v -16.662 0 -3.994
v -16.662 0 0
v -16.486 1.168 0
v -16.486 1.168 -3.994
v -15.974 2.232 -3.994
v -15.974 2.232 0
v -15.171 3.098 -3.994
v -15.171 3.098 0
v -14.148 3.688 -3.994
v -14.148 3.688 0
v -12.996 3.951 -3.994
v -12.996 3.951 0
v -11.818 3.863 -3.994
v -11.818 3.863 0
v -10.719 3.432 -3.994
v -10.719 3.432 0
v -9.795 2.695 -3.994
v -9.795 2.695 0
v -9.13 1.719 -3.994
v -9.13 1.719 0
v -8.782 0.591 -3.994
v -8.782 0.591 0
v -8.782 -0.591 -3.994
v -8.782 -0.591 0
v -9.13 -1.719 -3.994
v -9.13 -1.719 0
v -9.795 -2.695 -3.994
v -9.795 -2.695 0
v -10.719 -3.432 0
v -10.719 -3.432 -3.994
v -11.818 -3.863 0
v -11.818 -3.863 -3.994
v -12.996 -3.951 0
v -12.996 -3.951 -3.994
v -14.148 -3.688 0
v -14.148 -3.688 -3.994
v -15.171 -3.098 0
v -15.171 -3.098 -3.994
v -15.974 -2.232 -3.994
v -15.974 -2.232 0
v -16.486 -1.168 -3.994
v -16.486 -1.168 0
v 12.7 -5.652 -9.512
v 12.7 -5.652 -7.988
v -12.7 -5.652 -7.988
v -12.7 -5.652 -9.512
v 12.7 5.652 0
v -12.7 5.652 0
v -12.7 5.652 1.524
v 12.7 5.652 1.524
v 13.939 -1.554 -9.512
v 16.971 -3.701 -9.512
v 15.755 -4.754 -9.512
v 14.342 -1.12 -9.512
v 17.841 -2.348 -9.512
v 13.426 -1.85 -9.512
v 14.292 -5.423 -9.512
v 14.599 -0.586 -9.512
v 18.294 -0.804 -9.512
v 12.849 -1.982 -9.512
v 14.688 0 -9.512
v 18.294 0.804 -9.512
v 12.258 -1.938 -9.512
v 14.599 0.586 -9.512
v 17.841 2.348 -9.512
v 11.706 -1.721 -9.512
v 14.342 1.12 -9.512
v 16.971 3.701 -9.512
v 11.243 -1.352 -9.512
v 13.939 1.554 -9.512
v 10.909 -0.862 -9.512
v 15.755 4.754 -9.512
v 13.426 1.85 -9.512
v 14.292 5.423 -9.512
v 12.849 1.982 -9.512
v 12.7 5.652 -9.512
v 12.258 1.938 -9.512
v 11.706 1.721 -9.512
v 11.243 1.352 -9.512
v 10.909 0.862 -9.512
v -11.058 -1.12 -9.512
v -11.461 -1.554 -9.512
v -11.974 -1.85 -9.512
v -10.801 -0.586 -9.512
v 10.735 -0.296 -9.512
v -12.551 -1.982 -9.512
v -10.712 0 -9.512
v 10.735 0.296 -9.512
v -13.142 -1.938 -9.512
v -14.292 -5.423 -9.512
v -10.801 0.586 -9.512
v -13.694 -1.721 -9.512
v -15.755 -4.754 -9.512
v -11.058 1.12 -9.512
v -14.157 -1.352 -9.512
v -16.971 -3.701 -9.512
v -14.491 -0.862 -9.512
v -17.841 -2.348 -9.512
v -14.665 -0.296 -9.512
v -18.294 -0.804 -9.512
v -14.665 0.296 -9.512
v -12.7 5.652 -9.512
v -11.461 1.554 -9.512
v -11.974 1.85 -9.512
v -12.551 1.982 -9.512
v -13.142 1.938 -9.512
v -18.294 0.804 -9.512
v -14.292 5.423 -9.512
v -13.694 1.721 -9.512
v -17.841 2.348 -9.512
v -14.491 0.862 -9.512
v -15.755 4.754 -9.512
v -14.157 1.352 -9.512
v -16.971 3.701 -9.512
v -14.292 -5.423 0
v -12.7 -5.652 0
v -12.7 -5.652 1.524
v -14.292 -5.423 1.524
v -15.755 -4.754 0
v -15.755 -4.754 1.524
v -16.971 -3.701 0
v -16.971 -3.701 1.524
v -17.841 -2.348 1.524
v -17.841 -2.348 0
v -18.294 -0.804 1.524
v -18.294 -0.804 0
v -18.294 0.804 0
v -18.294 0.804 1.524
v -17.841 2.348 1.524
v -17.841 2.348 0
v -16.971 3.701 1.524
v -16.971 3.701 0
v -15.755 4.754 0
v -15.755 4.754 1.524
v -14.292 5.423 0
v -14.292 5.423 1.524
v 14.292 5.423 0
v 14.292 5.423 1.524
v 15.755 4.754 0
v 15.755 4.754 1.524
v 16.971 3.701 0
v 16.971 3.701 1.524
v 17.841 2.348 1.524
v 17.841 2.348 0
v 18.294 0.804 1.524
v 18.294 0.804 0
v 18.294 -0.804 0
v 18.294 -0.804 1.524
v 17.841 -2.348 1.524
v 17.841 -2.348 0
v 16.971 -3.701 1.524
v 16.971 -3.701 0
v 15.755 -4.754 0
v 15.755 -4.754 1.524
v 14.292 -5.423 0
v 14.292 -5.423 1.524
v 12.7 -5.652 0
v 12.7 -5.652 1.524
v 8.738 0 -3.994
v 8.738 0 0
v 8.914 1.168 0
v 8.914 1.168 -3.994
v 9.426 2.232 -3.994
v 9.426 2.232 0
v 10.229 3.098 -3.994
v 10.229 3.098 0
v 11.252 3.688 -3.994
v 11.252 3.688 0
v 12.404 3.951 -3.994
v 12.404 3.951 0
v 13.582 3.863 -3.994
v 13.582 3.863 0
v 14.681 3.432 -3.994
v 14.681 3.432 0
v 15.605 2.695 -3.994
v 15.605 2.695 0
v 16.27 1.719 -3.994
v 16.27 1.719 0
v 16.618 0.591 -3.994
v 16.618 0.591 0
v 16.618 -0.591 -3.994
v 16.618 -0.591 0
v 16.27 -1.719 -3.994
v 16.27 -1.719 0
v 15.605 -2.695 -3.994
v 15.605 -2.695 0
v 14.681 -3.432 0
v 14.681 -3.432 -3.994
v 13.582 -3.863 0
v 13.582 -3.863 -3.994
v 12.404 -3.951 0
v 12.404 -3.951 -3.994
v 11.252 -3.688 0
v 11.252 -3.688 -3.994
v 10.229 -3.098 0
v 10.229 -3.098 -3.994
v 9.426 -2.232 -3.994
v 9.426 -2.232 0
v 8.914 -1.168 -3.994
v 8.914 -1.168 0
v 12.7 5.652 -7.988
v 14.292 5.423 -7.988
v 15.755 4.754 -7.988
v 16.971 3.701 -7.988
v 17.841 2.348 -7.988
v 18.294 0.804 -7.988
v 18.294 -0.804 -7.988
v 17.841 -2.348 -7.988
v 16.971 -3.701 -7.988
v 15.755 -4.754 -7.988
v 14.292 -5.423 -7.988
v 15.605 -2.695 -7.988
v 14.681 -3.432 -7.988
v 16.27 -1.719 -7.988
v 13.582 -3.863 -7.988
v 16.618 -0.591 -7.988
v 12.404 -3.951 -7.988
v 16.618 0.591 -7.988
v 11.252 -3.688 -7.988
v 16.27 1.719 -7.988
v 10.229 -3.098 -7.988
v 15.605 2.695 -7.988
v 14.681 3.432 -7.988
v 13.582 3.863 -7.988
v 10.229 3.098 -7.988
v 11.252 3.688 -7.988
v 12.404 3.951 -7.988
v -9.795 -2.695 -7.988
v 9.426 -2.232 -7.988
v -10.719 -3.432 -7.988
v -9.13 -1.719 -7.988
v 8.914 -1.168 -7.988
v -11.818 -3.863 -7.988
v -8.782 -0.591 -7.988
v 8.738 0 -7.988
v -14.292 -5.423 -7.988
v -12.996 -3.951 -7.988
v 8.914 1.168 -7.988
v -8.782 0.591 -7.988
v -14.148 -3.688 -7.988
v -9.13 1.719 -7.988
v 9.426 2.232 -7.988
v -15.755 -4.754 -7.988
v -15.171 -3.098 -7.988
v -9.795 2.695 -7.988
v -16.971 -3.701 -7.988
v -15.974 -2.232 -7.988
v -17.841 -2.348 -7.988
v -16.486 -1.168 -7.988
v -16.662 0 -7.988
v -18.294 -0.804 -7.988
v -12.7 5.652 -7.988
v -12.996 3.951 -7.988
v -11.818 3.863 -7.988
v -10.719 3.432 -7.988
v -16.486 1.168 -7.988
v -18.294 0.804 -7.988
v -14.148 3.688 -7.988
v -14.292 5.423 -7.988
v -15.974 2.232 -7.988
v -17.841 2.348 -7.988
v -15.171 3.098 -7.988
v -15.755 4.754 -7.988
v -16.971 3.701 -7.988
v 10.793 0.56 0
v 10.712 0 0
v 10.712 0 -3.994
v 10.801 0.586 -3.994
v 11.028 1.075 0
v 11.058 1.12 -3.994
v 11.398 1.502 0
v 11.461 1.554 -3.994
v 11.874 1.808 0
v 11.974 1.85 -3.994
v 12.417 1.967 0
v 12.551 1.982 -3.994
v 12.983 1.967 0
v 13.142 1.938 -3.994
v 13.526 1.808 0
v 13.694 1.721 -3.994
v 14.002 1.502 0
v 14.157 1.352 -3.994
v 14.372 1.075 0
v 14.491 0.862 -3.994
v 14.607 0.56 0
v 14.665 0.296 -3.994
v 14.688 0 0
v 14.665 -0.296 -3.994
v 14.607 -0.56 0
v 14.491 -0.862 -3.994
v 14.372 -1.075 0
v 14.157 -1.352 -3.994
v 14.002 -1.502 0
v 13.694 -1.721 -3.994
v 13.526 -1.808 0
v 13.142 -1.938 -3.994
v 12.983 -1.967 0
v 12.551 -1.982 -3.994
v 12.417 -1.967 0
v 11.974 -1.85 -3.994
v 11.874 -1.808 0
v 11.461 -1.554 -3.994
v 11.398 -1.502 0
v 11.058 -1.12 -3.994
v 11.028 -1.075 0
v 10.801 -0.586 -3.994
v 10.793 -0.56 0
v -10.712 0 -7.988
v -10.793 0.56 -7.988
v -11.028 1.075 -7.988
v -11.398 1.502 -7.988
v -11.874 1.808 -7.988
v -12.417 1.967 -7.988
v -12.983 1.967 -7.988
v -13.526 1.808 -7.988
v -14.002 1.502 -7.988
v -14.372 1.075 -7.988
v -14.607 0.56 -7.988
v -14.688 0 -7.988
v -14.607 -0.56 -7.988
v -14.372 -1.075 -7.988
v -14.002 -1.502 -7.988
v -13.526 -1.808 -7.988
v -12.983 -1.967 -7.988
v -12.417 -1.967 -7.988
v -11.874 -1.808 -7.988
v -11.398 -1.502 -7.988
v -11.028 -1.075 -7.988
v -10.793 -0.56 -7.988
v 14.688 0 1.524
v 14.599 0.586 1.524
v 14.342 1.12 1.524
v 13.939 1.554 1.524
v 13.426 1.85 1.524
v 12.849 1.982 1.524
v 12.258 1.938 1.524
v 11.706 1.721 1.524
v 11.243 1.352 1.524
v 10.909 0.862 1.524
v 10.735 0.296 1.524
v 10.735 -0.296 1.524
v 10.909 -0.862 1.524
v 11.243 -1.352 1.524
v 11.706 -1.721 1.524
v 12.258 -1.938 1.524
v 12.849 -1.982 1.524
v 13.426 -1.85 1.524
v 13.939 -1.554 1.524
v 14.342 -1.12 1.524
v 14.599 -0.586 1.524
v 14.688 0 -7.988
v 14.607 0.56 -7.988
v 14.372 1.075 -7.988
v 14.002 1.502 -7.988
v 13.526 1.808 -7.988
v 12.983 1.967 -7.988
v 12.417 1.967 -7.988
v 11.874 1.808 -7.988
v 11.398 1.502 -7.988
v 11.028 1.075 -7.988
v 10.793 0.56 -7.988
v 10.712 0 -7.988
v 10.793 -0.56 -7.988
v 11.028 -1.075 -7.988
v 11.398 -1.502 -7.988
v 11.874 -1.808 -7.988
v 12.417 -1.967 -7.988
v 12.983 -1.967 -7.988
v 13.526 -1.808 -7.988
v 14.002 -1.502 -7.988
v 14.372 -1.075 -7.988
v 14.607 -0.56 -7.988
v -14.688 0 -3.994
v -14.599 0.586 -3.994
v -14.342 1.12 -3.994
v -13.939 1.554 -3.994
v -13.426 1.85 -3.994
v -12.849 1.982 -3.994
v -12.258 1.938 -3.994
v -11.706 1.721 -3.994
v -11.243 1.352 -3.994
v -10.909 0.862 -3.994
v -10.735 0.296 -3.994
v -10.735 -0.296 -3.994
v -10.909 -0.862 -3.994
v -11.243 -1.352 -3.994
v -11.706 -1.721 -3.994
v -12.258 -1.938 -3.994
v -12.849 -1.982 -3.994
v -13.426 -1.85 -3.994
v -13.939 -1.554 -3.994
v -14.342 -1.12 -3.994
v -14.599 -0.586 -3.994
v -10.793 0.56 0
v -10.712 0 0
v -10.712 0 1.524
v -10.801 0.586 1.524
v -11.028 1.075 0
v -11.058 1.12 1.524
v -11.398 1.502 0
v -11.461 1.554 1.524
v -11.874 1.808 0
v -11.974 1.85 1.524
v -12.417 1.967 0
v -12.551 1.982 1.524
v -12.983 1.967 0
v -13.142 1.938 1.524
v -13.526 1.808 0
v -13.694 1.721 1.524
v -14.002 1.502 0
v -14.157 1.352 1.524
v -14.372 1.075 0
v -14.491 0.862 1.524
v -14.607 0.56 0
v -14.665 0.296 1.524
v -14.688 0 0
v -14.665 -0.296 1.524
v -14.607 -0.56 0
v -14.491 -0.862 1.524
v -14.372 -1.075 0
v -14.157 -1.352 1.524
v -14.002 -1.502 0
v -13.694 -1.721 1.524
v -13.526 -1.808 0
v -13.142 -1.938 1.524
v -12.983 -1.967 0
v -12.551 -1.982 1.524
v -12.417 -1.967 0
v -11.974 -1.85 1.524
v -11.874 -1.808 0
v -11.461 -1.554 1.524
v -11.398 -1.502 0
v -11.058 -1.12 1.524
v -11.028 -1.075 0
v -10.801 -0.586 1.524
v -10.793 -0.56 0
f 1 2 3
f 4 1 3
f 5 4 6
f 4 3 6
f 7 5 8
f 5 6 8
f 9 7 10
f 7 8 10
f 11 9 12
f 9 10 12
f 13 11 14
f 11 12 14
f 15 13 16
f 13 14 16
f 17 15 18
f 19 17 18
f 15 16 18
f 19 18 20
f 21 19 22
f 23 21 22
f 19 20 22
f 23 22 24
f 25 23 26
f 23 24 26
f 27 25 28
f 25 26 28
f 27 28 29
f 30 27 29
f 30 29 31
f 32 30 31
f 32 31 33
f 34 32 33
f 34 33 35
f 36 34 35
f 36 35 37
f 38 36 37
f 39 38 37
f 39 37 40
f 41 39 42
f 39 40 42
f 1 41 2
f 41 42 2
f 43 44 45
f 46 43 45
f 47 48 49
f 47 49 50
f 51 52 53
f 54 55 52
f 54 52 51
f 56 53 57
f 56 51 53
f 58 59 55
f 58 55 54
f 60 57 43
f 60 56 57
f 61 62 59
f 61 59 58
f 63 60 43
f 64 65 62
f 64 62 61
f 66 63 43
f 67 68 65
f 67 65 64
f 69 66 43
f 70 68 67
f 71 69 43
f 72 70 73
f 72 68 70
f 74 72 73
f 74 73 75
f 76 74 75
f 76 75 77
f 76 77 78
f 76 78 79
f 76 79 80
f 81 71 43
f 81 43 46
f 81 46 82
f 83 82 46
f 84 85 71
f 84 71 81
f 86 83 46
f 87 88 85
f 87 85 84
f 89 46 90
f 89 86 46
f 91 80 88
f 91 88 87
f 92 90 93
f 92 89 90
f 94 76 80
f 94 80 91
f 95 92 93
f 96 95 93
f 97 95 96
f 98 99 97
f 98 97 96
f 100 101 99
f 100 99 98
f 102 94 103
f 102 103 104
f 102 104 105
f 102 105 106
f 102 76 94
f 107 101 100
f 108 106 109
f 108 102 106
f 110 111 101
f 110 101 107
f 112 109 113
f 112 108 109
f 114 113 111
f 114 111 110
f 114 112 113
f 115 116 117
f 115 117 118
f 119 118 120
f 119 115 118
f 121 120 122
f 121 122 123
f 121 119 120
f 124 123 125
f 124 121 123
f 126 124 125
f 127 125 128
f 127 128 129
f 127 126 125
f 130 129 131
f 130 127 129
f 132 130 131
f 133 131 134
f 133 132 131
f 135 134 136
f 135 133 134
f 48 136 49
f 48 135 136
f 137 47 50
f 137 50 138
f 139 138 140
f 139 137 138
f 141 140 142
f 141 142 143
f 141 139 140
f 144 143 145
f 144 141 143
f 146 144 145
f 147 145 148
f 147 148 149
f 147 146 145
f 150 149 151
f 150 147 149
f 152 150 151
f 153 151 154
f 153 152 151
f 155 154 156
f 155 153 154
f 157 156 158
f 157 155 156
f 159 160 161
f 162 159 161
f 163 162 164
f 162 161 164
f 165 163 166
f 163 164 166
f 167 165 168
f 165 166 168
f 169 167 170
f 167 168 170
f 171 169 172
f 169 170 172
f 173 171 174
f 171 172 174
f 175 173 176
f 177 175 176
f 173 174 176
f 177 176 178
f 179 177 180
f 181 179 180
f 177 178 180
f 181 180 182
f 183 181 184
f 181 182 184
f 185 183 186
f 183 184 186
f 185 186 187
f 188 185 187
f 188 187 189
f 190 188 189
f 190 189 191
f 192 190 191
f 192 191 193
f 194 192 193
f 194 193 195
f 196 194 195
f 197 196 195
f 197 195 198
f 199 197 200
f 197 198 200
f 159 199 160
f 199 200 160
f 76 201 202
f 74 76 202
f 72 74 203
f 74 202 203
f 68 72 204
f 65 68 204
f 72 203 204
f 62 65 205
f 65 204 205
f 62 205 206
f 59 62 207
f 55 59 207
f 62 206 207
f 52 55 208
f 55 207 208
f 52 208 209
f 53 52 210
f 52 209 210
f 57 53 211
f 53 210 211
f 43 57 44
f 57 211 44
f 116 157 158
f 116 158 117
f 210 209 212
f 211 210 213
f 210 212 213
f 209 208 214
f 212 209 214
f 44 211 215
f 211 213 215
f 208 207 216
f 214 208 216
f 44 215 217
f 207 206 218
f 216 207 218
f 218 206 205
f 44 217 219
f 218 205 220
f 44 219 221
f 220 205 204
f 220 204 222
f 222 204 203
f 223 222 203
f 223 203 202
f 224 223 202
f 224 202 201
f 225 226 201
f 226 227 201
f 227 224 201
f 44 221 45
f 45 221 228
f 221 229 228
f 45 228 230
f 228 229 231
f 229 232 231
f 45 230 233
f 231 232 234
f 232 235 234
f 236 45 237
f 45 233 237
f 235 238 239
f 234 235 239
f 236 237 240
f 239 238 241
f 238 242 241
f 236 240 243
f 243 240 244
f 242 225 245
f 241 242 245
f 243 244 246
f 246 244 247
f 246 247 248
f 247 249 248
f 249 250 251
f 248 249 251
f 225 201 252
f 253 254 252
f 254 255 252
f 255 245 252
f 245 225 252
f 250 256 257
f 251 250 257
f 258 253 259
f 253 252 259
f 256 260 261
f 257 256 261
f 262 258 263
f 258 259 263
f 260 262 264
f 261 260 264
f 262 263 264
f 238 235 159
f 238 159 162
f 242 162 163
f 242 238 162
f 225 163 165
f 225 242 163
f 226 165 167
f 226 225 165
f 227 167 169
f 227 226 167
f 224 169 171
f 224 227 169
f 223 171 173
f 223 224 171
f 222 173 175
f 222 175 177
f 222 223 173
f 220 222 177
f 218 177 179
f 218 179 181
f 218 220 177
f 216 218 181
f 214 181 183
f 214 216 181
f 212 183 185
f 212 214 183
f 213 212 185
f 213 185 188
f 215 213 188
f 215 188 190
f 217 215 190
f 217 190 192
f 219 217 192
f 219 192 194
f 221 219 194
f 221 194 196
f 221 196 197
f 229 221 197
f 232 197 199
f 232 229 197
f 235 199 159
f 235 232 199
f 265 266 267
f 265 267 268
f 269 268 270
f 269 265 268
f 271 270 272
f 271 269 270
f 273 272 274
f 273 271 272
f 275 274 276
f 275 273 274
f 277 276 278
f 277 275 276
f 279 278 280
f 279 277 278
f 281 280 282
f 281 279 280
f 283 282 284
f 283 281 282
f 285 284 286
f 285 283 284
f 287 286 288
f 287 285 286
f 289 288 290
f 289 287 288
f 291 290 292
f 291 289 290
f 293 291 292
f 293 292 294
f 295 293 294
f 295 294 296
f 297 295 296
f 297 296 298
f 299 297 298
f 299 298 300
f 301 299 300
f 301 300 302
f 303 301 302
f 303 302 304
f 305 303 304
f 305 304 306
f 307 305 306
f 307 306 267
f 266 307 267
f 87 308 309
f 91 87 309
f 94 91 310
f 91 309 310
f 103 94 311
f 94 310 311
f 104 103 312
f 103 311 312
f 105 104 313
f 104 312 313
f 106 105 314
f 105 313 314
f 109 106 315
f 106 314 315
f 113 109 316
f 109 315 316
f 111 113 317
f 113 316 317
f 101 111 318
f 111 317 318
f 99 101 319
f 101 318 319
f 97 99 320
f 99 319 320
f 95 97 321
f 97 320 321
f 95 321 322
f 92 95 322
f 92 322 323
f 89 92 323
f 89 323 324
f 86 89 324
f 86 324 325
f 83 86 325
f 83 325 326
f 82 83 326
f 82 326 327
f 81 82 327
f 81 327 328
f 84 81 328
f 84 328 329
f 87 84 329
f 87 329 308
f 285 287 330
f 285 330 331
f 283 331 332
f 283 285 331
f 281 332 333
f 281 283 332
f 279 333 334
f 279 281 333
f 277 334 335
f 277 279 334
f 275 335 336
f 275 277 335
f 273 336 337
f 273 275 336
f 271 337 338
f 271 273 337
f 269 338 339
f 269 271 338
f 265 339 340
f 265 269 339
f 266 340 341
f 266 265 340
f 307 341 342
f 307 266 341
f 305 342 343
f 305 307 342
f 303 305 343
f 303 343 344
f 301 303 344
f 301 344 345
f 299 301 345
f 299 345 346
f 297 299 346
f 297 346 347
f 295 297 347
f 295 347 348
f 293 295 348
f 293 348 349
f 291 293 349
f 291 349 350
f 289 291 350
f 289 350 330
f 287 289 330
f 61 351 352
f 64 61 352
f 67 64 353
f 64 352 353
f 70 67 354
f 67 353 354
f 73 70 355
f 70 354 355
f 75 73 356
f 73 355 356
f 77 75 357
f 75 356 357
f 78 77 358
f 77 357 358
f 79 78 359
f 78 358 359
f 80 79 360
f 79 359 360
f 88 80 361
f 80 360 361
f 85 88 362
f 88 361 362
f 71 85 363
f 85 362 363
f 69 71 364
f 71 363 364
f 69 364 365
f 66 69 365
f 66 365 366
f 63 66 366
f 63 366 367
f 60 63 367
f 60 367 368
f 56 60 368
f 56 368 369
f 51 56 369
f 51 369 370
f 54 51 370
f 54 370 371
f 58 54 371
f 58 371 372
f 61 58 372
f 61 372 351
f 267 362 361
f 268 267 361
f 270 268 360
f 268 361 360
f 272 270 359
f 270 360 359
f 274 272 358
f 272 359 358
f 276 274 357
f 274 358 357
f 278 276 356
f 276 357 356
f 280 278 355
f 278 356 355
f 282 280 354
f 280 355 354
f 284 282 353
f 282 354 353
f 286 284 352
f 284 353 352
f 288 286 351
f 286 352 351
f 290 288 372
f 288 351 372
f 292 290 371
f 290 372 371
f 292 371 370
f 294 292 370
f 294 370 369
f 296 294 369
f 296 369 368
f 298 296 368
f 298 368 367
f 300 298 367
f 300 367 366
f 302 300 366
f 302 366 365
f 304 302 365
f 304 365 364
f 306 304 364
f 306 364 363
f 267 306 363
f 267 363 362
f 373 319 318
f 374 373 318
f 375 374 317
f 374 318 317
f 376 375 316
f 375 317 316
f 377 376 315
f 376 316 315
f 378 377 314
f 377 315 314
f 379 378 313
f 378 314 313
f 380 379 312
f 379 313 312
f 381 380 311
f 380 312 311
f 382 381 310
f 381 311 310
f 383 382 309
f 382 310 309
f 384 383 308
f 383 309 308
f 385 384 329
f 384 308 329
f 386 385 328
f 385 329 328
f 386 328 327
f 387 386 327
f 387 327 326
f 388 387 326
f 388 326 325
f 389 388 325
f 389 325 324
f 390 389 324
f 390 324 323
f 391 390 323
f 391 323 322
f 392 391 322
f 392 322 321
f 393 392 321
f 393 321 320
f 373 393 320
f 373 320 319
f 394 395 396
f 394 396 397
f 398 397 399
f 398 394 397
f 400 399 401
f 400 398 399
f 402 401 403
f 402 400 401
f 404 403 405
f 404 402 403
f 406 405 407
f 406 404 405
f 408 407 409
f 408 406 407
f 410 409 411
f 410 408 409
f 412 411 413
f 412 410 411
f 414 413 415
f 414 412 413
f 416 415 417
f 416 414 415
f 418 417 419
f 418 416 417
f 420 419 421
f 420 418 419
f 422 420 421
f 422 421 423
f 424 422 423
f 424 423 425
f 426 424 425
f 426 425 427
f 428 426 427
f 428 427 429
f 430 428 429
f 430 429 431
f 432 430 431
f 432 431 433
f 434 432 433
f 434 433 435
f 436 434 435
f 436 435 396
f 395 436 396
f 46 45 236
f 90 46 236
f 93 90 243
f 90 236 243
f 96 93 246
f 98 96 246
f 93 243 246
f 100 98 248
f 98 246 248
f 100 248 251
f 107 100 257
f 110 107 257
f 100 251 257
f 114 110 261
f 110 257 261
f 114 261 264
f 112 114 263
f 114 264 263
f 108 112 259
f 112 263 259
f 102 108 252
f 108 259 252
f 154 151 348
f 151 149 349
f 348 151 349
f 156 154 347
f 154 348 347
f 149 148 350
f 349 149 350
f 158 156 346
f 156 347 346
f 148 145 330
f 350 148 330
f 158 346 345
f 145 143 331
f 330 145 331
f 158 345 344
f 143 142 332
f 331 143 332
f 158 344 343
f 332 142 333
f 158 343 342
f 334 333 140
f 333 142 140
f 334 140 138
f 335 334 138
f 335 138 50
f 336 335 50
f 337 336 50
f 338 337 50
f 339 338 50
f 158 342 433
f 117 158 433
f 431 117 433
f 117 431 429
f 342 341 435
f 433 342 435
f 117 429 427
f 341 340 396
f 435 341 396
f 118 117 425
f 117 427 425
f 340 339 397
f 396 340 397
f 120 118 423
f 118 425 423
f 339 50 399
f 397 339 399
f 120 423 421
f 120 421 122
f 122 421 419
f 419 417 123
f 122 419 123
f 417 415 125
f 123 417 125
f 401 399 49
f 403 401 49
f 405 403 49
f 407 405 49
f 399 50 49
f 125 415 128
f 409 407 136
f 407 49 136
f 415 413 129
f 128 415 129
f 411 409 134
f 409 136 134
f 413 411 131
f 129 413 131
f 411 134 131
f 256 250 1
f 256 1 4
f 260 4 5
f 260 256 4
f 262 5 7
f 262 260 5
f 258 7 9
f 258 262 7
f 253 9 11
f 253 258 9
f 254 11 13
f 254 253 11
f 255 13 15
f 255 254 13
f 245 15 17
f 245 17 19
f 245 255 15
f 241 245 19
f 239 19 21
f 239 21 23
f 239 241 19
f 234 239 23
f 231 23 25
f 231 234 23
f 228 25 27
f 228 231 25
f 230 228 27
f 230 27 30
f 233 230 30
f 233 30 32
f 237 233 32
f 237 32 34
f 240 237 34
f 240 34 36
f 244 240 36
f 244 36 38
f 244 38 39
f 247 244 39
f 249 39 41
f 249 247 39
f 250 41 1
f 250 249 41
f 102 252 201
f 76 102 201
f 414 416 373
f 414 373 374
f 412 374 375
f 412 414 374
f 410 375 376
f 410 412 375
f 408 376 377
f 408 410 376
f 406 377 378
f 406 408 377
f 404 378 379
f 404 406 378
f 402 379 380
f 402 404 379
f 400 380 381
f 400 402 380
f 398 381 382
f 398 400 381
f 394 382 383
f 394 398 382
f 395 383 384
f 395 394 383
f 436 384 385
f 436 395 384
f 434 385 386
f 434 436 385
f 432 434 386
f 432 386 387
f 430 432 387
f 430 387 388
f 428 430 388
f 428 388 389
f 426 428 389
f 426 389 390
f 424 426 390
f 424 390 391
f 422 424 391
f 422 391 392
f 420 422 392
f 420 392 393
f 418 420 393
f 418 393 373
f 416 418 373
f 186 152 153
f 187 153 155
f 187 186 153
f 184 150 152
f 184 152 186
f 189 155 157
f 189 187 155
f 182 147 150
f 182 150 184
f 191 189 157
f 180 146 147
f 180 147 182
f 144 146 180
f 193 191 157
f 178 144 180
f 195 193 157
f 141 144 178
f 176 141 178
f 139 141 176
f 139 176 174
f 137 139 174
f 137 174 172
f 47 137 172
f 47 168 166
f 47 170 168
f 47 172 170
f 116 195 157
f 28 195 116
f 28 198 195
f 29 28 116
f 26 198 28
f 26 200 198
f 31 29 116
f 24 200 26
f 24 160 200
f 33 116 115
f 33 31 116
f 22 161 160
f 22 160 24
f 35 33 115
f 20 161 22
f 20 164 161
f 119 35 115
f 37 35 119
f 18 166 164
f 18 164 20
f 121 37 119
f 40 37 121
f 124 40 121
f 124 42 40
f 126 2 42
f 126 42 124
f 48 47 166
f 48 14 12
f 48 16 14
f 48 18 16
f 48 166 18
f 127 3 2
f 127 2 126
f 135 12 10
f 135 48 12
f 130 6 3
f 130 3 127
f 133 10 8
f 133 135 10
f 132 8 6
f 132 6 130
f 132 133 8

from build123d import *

# Parameters (mm, degrees)
SKETCH1_R           = 1.98755
BOSS_EXTRUDE1_DEPTH = 1.524
SKETCH3_R           = 3.9624
SKETCH3_R_2         = 1.98755
BOSS_EXTRUDE2_DEPTH = 3.99415


with BuildPart() as part:
    # Sketch1 → Boss-Extrude1 (new body)
    with BuildSketch(Plane.XY):
        with BuildLine():
            Line((-12.7, 5.6515), (12.7, 5.6515))
            ThreePointArc((12.7, 5.6515), (18.3515, 0), (12.7, -5.6515))
            Line((12.7, -5.6515), (-12.7, -5.6515))
            ThreePointArc((-12.7, -5.6515), (-18.3515, 0), (-12.7, 5.6515))
        make_face()
        with Locations((-12.7, 0)):
            Circle(SKETCH1_R, mode=Mode.SUBTRACT)
        with Locations((12.7, 0)):
            Circle(SKETCH1_R, mode=Mode.SUBTRACT)
    boss_extrude1 = extrude(amount=BOSS_EXTRUDE1_DEPTH)

    # Sketch3 → Boss-Extrude2 (add)
    with BuildSketch(Plane(origin=(0, 0, 0), x_dir=(-1, 0, 0), z_dir=(0, 0, -1))):
        with Locations((-12.7, 0)):
            Circle(SKETCH3_R)
        with Locations((-12.7, 0)):
            Circle(SKETCH3_R_2, mode=Mode.SUBTRACT)
        with Locations((12.7, 0)):
            Circle(SKETCH3_R)
        with Locations((12.7, 0)):
            Circle(SKETCH3_R_2, mode=Mode.SUBTRACT)
    boss_extrude2 = extrude(amount=BOSS_EXTRUDE2_DEPTH)

    # Mirror4: Boss-Extrude1, Boss-Extrude2 across plane
    add(boss_extrude1.mirror(Plane.XY.offset(-3.99415)))
    add(boss_extrude2.mirror(Plane.XY.offset(-3.99415)))


solid = part.part
